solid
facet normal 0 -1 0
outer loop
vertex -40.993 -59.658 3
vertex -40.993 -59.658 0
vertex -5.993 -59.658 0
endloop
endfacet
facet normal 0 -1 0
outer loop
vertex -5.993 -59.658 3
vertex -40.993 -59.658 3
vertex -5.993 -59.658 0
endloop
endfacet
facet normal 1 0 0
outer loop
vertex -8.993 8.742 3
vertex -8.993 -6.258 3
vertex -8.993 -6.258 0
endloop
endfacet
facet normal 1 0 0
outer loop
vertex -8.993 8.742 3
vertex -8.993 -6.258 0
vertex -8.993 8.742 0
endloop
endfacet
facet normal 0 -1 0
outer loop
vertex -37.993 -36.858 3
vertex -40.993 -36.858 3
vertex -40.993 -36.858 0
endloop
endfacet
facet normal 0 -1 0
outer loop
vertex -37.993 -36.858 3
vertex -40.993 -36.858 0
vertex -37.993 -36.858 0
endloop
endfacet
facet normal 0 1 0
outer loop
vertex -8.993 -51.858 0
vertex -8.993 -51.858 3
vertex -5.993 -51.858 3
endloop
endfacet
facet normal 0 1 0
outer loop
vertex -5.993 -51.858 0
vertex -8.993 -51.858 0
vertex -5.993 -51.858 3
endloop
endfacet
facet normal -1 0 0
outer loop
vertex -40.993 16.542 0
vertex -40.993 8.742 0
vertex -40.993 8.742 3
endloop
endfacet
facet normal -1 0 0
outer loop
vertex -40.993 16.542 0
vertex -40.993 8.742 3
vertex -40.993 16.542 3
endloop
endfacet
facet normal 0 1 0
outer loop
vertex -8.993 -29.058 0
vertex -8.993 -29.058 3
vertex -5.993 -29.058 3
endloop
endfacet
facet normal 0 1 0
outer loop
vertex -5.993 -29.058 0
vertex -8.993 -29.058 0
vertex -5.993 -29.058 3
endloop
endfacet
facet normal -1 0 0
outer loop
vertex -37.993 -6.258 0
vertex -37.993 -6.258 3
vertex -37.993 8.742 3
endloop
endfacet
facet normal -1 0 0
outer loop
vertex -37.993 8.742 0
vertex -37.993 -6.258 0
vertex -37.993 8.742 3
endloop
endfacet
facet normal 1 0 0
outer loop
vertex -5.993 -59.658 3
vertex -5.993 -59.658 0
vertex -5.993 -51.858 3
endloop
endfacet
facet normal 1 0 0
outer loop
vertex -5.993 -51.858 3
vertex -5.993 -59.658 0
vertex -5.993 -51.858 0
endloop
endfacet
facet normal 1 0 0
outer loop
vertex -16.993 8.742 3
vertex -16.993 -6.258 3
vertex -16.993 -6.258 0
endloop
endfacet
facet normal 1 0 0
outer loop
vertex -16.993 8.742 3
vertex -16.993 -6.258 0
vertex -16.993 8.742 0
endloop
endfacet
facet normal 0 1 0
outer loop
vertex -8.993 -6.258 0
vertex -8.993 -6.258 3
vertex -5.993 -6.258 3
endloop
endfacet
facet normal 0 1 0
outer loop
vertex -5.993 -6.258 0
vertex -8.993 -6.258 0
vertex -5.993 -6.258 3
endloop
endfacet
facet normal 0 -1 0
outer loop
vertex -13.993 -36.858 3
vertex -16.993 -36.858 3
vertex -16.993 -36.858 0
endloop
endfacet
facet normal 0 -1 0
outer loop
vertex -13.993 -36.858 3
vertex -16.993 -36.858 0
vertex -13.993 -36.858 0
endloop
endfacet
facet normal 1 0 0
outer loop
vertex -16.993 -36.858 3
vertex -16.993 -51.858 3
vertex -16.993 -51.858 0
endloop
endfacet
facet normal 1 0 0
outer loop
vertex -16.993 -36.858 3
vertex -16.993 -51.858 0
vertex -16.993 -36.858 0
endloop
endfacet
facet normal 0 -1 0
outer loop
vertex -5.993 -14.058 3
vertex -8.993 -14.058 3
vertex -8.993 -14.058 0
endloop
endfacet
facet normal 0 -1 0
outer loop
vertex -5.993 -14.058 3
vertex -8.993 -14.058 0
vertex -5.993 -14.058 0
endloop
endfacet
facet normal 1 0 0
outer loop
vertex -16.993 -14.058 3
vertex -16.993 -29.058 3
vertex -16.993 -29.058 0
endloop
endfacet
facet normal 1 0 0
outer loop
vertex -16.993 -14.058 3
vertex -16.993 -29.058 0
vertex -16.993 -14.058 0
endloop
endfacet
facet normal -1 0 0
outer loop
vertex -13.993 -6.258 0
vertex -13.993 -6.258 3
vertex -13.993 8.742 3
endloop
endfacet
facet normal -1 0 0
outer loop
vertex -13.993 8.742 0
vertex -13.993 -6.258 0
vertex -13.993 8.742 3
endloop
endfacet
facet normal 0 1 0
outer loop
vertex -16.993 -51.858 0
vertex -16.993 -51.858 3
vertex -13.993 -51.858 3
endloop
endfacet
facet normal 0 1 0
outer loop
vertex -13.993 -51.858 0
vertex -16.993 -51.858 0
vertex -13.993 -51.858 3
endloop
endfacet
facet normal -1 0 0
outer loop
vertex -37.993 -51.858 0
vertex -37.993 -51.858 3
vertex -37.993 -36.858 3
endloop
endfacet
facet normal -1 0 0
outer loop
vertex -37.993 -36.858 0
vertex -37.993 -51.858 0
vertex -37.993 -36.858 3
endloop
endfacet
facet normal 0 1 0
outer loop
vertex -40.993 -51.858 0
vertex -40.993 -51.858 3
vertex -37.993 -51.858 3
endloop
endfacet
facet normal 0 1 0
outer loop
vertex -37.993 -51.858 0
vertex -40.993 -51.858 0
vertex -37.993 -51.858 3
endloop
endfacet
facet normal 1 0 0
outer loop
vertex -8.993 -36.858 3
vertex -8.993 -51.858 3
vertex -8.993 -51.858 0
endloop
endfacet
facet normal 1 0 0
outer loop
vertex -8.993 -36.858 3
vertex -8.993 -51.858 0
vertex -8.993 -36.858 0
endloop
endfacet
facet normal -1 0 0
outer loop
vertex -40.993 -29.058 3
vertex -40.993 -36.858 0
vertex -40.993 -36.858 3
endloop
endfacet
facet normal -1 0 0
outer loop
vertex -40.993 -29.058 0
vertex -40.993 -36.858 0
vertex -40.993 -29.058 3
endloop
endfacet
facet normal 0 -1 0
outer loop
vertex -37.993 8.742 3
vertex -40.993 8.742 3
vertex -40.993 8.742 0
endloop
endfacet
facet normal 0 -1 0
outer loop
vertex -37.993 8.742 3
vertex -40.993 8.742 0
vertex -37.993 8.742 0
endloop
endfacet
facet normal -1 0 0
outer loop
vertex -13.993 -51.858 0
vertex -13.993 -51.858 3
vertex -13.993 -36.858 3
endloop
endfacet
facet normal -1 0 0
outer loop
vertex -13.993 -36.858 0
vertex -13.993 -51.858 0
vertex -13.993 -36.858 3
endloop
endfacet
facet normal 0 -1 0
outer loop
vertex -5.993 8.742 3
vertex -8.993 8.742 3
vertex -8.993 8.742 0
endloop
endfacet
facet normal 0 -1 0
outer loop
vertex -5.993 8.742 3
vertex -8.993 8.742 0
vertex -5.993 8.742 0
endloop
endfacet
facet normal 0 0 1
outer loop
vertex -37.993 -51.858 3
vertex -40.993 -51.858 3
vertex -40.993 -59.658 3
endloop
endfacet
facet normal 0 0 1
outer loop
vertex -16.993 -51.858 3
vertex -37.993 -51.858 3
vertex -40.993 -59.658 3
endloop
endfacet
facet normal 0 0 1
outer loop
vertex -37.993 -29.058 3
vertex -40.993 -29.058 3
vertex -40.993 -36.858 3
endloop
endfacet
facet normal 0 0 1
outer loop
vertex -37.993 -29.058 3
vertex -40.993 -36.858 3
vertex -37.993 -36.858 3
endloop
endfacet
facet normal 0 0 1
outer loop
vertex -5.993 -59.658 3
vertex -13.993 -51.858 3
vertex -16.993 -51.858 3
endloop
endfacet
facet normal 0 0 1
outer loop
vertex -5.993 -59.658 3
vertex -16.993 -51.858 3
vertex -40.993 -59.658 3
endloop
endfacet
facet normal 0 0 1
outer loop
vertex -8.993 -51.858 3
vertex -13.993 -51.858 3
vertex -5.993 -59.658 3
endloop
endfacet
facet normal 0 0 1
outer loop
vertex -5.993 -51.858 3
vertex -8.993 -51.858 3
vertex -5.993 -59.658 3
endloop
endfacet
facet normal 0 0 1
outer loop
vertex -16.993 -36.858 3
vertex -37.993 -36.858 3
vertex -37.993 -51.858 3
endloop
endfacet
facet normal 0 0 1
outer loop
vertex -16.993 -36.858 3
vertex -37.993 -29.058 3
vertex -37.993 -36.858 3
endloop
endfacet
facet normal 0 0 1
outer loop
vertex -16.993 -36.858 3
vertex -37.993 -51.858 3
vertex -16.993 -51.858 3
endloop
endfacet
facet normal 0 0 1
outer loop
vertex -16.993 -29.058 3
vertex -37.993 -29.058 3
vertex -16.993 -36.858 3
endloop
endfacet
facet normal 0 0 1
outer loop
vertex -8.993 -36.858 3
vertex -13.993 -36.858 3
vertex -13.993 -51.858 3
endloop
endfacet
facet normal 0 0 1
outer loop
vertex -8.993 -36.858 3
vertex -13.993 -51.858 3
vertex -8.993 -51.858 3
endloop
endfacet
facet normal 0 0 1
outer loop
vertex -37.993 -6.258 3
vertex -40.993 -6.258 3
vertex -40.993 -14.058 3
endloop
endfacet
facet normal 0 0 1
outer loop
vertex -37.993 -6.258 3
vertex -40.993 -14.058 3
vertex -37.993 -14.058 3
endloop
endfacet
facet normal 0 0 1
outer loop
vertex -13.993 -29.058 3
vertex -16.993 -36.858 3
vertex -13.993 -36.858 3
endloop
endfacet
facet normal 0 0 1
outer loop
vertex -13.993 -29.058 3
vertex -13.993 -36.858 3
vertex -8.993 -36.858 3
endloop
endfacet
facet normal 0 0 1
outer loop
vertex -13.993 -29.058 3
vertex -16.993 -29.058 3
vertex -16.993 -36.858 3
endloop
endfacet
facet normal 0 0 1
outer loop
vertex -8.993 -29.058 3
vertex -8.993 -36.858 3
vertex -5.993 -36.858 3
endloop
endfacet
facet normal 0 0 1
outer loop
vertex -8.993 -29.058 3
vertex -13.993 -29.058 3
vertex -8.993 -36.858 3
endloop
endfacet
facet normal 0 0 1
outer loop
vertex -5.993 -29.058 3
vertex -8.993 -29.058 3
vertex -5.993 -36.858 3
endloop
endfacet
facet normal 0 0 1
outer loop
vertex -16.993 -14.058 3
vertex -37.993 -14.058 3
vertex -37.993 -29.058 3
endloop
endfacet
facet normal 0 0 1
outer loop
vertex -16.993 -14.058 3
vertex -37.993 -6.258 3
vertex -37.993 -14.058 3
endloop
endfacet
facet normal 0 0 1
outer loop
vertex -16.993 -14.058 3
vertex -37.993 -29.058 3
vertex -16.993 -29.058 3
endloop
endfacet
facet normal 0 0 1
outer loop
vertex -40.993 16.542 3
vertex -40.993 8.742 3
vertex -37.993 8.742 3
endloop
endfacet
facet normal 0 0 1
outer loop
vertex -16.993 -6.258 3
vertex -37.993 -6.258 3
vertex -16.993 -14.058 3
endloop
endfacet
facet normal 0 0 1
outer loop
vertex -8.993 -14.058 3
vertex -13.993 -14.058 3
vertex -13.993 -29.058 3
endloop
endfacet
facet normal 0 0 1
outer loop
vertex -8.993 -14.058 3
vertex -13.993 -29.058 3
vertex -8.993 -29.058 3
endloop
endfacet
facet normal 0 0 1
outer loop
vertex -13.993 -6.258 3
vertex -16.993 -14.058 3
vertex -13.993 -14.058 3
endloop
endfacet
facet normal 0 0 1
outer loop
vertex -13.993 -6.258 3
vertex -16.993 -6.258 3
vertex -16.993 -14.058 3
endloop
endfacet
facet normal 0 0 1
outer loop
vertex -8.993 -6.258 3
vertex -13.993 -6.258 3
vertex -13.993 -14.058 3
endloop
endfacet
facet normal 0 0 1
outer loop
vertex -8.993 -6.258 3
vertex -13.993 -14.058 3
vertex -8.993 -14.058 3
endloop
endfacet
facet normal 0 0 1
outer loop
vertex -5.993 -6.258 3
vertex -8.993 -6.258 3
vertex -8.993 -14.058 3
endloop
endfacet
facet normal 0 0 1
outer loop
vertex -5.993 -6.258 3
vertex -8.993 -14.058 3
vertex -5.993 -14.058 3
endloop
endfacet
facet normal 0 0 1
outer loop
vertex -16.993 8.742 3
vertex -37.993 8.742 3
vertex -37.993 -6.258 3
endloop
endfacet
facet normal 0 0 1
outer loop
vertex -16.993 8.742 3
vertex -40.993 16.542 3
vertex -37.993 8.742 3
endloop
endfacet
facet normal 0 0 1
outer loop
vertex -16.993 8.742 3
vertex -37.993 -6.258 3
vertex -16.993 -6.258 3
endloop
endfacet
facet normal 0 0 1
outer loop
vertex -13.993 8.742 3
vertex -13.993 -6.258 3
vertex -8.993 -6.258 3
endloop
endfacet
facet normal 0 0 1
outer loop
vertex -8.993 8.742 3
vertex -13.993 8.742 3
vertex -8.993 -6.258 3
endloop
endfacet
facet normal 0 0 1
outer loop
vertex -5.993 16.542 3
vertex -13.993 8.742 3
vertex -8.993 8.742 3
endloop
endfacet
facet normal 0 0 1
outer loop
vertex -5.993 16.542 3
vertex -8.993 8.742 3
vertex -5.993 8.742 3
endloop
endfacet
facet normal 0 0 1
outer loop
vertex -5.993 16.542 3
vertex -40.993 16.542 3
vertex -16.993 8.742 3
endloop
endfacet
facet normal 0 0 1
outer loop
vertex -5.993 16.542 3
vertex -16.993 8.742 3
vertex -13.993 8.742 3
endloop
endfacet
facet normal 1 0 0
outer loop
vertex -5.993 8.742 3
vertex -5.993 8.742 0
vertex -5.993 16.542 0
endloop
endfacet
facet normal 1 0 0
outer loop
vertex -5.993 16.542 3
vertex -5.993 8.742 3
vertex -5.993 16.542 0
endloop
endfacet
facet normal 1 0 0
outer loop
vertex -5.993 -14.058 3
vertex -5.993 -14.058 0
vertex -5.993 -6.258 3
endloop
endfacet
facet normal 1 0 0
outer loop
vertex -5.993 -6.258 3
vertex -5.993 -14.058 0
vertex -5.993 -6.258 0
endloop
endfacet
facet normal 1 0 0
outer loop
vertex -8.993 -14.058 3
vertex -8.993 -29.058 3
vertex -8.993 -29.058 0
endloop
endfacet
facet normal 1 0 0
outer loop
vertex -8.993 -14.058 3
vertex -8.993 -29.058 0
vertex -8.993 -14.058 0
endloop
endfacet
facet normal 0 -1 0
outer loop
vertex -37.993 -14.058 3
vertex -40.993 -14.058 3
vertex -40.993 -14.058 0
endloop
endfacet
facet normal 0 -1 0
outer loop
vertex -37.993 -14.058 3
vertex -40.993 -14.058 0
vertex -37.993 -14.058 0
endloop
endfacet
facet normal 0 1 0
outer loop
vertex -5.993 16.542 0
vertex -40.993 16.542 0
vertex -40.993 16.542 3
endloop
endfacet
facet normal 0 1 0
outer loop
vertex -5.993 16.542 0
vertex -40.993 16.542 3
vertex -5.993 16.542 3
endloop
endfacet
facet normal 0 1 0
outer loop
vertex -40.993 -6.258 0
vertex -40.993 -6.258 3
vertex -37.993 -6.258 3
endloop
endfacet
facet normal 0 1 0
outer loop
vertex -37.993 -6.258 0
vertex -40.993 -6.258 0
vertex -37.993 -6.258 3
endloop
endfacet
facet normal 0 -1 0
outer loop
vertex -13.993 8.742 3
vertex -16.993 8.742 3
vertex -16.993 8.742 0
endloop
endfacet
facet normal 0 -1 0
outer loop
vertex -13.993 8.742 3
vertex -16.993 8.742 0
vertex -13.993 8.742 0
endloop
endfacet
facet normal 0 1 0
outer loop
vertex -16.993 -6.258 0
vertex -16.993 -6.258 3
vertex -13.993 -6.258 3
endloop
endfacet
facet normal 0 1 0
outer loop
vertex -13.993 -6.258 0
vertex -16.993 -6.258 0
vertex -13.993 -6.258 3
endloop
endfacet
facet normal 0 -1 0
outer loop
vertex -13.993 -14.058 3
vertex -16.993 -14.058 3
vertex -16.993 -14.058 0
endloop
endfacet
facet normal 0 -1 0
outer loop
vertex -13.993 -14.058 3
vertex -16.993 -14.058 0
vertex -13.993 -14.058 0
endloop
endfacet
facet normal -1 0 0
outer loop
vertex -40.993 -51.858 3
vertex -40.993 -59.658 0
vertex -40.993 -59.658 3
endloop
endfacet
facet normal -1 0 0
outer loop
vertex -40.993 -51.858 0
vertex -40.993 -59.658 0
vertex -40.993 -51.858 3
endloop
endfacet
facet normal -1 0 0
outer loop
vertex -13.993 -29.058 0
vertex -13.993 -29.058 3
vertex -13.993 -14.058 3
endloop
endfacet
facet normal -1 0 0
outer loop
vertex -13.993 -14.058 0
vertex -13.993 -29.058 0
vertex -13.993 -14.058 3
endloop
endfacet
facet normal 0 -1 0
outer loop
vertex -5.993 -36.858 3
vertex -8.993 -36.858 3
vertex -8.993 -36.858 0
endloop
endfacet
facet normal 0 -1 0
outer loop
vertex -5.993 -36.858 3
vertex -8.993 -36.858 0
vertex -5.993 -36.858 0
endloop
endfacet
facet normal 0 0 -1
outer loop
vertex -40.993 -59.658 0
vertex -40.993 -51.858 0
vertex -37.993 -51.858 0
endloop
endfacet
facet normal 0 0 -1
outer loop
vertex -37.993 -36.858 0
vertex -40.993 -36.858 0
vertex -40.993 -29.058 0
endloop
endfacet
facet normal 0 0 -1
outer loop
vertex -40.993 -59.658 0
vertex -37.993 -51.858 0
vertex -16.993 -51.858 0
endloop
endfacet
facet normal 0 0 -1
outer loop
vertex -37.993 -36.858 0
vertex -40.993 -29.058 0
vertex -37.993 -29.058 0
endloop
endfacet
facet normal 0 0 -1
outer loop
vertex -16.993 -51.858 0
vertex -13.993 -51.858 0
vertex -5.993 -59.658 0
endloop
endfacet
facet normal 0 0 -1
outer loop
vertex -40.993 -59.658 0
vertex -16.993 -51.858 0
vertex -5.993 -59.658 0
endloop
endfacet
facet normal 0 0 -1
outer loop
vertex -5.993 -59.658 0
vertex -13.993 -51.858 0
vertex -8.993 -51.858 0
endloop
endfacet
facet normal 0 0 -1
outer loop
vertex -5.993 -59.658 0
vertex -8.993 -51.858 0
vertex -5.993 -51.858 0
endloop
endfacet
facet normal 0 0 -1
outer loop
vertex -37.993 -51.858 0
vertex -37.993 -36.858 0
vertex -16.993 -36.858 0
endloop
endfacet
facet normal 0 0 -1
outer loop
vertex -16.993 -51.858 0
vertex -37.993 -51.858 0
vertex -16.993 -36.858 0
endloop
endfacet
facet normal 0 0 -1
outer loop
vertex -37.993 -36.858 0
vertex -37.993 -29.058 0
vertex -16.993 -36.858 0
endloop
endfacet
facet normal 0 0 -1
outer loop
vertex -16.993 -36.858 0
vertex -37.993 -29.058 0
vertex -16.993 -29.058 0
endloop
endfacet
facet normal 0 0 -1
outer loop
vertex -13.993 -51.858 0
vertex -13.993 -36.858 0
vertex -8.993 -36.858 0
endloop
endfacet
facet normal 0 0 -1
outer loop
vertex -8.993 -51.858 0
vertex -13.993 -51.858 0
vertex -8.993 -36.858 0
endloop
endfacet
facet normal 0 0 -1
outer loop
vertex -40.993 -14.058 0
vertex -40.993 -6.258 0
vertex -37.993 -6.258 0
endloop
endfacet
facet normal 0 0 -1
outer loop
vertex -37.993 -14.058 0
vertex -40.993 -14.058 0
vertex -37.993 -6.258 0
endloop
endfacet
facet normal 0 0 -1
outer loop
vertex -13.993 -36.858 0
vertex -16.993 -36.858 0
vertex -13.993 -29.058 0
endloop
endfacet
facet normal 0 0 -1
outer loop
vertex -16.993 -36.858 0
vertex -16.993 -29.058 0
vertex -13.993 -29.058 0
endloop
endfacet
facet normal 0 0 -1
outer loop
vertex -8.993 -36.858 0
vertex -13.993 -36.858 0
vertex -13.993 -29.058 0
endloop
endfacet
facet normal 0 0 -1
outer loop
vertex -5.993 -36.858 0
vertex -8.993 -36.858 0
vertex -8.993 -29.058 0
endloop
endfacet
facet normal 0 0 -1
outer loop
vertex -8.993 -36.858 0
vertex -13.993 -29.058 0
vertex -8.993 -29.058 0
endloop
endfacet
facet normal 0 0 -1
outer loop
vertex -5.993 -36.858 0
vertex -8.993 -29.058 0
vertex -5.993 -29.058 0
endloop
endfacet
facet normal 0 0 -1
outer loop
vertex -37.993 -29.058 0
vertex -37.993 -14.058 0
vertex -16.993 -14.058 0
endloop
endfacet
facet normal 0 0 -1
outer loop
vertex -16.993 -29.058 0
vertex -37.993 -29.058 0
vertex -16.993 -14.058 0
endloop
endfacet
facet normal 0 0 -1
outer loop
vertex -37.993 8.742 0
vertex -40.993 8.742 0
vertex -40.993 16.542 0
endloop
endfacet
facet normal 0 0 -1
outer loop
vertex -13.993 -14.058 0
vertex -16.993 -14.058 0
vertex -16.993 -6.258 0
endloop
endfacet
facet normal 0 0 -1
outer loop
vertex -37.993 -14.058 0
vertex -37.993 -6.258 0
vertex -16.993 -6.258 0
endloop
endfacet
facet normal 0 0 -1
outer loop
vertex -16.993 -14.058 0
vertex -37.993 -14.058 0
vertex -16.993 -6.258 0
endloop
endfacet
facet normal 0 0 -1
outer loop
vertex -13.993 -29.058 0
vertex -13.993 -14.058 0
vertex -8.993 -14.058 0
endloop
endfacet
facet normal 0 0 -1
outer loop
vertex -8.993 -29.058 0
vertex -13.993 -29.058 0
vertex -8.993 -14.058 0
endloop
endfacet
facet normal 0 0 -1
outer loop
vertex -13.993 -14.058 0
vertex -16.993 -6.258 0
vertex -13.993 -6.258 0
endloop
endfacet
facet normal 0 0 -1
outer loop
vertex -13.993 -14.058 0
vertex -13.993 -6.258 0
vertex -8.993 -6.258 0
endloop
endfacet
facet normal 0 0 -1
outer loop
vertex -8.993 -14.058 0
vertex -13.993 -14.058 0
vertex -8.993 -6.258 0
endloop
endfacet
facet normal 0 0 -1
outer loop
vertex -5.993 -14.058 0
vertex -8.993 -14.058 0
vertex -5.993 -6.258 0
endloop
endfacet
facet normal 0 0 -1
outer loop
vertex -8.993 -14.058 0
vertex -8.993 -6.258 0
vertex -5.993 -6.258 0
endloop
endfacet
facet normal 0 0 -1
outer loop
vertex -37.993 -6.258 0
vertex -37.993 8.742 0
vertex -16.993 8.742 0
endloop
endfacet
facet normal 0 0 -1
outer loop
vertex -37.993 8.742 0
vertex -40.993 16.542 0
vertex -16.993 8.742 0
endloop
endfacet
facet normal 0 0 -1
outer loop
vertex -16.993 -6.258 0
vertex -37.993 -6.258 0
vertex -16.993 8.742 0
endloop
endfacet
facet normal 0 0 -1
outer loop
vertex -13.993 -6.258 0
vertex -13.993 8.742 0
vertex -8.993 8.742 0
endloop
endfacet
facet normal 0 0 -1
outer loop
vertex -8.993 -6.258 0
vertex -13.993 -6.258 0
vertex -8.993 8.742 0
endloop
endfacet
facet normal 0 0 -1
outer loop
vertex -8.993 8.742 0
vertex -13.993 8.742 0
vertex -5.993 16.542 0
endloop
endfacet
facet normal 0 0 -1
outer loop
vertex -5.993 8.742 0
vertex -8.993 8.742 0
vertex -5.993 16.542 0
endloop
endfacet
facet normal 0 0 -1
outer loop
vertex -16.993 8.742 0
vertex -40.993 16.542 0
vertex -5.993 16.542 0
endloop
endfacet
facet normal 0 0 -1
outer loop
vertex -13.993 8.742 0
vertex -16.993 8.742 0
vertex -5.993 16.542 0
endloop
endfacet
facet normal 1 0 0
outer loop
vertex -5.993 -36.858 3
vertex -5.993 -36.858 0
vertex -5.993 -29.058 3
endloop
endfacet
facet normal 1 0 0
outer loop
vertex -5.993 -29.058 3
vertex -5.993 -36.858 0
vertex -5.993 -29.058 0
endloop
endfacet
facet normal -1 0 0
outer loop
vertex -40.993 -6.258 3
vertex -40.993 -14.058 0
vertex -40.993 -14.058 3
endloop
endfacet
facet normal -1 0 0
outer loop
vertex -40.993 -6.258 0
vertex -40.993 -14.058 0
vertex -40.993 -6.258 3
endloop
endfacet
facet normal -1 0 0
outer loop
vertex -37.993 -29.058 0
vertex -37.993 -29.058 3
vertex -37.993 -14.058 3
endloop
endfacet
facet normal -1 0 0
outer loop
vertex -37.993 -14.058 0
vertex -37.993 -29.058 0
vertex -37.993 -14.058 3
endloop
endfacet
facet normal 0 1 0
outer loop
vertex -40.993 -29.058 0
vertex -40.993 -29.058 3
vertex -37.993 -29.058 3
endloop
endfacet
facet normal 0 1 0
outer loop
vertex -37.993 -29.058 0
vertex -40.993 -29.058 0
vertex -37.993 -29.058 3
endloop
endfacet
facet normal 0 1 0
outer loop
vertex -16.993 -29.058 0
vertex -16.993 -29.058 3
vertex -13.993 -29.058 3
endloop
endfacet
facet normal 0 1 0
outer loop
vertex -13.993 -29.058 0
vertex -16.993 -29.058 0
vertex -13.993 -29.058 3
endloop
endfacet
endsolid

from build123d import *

# Parameters (mm, degrees)
SKETCH1_W           = 35
SKETCH1_H           = 76.2
BOSS_EXTRUDE1_DEPTH = 3
SKETCH2_W           = 3
SKETCH2_H           = 15
CUT_EXTRUDE1_DEPTH  = 73.446802019
LPATTERN1_COUNT     = 3
LPATTERN1_PITCH     = 22.8
SKETCH3_W           = 3
SKETCH3_H           = 15
CUT_EXTRUDE2_DEPTH  = 73.446802019
LPATTERN2_COUNT     = 3
LPATTERN2_PITCH     = 22.8


with BuildPart() as part:
    # Sketch1 → Boss-Extrude1 (new body)
    with BuildSketch(Plane.XY):
        with Locations((-23.493460648, -21.557986111)):
            Rectangle(SKETCH1_W, SKETCH1_H)
    extrude(amount=BOSS_EXTRUDE1_DEPTH)

    # Sketch2 → Cut-Extrude1 (cut, through all)
    with BuildSketch(Plane.XY.offset(3)):
        with Locations((-39.493460648, 1.242013889)):
            Rectangle(SKETCH2_W, SKETCH2_H)
        with Locations((-7.493460648, 1.242013889)):
            Rectangle(SKETCH2_W, SKETCH2_H)
    cut_extrude1 = extrude(amount=-CUT_EXTRUDE1_DEPTH, mode=Mode.SUBTRACT)

    # LPattern1: Cut-Extrude1 ×3
    with Locations(*[(0, -i * LPATTERN1_PITCH, 0) for i in range(1, LPATTERN1_COUNT)]):
        add(cut_extrude1, mode=Mode.SUBTRACT)

    # Sketch3 → Cut-Extrude2 (cut, through all)
    with BuildSketch(Plane.XY.offset(3)):
        with Locations((-15.493460648, 1.242013889)):
            Rectangle(SKETCH3_W, SKETCH3_H)
    cut_extrude2 = extrude(amount=-CUT_EXTRUDE2_DEPTH, mode=Mode.SUBTRACT)

    # LPattern2: Cut-Extrude2 ×3
    with Locations(*[(0, -i * LPATTERN2_PITCH, 0) for i in range(1, LPATTERN2_COUNT)]):
        add(cut_extrude2, mode=Mode.SUBTRACT)


solid = part.part
